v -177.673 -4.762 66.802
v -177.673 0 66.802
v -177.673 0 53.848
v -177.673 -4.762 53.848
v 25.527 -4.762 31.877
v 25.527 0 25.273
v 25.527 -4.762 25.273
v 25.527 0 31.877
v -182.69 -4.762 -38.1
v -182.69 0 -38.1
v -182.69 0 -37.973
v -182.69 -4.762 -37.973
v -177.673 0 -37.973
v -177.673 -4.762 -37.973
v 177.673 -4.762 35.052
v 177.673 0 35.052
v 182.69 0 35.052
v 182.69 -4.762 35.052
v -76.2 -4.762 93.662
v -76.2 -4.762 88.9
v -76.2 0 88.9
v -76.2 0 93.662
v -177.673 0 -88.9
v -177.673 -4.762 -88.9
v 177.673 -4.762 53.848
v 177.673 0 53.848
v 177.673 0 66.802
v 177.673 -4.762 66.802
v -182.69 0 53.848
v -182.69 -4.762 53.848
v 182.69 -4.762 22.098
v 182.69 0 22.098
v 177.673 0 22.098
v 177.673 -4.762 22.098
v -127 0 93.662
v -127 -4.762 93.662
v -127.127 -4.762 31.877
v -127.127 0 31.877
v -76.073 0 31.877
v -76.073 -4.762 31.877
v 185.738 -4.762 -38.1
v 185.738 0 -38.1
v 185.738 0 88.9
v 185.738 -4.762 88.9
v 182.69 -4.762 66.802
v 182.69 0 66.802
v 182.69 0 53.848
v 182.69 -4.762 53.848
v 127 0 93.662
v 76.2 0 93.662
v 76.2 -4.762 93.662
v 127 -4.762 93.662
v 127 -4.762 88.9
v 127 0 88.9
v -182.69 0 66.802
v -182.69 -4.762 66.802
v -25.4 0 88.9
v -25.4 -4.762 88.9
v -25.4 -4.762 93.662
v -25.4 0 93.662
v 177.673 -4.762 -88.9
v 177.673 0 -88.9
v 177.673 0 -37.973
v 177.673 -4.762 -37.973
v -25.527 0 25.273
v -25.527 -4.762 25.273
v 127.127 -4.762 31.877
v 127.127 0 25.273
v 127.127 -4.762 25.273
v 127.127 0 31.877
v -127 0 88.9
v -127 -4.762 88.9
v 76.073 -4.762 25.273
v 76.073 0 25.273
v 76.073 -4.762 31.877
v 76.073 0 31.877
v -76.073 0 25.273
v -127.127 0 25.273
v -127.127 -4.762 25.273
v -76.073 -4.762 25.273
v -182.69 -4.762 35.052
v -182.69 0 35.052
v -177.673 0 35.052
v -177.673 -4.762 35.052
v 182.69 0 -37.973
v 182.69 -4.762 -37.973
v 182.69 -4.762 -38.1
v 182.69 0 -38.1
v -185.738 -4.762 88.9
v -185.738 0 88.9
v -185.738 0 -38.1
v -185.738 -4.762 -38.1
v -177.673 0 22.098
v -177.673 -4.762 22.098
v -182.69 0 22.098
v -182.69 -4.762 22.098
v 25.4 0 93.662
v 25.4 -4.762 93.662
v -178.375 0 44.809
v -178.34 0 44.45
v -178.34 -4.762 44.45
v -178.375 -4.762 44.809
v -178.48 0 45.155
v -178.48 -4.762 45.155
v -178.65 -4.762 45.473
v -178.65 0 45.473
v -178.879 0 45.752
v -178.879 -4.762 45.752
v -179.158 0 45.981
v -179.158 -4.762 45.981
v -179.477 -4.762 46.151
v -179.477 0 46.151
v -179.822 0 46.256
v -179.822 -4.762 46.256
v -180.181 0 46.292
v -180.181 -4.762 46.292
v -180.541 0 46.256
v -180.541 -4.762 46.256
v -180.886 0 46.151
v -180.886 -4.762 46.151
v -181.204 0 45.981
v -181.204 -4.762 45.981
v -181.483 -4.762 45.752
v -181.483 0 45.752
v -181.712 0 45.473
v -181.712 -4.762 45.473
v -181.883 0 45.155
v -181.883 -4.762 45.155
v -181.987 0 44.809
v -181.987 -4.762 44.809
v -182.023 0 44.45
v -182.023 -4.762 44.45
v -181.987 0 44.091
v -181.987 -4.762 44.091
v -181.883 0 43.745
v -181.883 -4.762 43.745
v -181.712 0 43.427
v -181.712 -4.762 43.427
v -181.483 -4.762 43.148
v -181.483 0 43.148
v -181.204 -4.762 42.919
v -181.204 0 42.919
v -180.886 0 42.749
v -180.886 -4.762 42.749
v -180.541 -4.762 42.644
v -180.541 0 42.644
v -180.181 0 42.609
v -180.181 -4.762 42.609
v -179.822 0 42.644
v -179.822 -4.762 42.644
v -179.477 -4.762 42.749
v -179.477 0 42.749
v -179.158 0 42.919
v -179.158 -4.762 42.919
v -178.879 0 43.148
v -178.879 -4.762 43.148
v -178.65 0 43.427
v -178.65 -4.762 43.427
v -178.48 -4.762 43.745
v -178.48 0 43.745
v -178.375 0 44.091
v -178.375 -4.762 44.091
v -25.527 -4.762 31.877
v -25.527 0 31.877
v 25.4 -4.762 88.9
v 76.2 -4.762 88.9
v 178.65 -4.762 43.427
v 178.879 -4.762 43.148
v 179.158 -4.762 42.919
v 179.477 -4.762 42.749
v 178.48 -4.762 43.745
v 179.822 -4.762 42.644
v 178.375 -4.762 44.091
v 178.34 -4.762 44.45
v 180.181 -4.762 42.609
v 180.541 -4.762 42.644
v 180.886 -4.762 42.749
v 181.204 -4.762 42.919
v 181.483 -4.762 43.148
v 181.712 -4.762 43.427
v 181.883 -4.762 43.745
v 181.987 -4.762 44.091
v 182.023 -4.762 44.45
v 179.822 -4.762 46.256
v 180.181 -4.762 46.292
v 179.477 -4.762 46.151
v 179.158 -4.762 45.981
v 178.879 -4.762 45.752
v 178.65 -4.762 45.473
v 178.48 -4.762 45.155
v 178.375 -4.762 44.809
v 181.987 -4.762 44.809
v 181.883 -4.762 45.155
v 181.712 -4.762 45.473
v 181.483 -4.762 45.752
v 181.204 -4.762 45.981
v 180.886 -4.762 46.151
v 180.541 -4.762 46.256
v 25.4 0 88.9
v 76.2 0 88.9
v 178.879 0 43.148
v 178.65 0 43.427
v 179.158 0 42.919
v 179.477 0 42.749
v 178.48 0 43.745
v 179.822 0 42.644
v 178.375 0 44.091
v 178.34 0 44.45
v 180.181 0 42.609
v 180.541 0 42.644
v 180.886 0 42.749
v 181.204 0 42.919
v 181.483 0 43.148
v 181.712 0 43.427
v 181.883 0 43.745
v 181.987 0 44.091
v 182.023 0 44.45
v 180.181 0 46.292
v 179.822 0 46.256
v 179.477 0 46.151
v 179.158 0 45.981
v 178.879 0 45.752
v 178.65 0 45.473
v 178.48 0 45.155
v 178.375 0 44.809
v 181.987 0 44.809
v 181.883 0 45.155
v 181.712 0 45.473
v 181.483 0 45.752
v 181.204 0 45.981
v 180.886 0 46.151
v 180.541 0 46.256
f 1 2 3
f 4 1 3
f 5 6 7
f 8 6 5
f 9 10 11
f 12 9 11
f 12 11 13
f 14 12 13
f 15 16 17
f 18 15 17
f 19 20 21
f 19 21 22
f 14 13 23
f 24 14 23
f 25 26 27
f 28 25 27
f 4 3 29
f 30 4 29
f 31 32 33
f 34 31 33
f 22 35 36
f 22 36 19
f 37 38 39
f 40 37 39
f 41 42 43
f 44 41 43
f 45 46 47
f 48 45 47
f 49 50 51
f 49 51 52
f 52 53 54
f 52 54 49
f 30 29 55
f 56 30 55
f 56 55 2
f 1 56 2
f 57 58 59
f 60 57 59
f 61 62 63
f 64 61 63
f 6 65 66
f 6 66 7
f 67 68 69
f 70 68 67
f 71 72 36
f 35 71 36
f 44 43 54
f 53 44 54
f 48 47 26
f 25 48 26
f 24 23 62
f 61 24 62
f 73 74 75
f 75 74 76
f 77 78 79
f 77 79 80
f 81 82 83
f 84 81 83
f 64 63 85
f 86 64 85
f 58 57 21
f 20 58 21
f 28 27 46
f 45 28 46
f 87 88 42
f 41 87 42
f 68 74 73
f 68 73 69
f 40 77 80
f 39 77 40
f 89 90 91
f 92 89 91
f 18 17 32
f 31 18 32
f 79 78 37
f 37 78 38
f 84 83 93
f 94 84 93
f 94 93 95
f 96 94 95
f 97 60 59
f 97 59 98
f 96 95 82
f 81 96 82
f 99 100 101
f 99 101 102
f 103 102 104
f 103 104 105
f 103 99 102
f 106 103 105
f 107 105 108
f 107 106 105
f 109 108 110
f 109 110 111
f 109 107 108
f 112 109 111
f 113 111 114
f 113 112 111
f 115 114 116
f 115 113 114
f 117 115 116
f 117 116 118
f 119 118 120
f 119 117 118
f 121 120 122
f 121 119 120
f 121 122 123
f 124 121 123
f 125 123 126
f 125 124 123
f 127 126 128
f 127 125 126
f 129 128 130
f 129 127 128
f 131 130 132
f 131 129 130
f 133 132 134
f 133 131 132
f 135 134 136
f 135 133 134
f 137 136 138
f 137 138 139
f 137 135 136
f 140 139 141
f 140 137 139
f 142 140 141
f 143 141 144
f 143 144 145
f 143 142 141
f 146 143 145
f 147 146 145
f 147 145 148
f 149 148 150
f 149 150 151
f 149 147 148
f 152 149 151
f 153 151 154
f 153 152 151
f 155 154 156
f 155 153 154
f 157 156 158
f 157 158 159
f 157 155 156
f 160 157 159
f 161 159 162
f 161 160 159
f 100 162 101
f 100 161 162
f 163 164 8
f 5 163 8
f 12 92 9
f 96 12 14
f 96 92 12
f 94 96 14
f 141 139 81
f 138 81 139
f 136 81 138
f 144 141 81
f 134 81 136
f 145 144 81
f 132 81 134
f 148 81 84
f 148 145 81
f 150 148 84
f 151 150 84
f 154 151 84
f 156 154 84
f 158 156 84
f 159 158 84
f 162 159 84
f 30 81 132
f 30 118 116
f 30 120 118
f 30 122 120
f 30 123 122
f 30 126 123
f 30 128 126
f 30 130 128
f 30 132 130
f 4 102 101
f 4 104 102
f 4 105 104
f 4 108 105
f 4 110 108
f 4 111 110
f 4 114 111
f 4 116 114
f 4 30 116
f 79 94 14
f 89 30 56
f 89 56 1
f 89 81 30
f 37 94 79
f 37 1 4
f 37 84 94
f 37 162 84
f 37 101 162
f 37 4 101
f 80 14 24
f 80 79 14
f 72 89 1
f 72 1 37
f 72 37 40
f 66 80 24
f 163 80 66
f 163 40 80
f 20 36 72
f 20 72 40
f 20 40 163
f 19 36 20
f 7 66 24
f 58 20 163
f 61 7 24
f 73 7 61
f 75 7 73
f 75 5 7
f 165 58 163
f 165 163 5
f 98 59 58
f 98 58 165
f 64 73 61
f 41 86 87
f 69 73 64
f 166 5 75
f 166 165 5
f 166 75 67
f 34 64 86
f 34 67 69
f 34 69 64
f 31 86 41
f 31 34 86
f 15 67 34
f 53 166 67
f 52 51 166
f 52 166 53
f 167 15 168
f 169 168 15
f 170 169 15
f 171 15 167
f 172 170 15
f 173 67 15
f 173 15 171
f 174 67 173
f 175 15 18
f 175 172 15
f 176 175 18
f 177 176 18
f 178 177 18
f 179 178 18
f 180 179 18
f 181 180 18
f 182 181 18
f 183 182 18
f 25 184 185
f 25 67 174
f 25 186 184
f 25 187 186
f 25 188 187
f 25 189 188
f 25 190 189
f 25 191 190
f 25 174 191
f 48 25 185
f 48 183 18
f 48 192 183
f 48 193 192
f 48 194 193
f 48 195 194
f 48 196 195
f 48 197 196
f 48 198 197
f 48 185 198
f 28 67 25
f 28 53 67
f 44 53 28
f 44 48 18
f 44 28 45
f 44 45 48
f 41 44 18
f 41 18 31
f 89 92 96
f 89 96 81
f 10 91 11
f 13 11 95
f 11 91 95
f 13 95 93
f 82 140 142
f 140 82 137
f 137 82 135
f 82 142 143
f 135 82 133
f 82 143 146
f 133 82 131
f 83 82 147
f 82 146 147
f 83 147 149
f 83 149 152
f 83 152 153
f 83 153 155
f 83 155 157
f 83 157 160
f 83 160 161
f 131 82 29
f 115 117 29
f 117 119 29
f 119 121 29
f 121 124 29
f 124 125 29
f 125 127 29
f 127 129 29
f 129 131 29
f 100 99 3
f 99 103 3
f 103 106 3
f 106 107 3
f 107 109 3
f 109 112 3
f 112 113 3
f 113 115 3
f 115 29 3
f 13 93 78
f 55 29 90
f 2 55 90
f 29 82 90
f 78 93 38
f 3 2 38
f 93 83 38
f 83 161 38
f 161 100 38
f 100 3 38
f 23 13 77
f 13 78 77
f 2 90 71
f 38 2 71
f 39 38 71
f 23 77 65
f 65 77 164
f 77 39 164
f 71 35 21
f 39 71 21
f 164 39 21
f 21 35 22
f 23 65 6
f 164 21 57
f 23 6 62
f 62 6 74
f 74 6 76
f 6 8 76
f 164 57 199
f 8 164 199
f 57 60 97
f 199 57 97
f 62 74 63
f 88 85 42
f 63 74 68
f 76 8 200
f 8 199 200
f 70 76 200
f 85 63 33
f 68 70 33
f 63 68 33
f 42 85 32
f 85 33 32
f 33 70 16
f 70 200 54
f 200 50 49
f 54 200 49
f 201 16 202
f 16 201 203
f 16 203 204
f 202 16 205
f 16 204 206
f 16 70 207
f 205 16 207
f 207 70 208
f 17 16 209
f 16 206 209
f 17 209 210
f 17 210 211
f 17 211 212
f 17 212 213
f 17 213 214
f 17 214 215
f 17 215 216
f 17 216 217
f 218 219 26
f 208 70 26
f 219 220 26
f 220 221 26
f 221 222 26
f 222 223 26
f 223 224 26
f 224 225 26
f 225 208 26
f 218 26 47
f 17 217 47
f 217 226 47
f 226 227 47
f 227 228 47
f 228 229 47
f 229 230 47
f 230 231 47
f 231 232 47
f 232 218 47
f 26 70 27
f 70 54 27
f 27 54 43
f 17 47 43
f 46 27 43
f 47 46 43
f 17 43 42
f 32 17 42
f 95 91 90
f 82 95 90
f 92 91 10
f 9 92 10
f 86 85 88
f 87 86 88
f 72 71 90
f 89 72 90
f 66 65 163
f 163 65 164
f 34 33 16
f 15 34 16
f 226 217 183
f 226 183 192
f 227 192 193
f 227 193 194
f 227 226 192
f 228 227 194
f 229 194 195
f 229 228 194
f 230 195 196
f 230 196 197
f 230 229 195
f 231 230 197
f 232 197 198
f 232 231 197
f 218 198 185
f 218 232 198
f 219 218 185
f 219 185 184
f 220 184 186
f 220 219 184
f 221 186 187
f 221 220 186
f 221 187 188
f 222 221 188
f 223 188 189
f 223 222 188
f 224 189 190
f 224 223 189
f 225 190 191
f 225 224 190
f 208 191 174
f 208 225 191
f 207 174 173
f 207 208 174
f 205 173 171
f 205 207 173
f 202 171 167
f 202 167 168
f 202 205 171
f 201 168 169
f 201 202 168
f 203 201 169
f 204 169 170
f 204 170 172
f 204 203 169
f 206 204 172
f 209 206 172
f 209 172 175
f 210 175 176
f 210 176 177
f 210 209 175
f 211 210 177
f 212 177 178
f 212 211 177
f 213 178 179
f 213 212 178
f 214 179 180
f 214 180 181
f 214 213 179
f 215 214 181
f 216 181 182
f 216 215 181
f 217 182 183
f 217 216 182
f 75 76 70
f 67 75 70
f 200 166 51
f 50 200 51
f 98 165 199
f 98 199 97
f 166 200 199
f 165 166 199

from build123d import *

# Parameters (mm, degrees)
F0_R     = 1.8415
F0_W     = 51.054
F0_H     = 6.604
F0_W_2   = 50.8
F0_H_2   = 4.7625
F1_DEPTH = 4.7625


with BuildPart() as f1:
    # F0 (on Front) → F1 (new body)
    with BuildSketch(Plane.XZ):
        Polygon((-127, 88.9), (-182.5625, 88.9), (-182.5625, 66.802), (-177.673, 66.802), (-177.673, 53.848), (-182.5625, 53.848), (-182.5625, 35.052), (-177.673, 35.052), (-177.673, 22.098), (-182.5625, 22.098), (-182.5625, -37.973), (-177.673, -37.973), (-177.673, -88.9), (177.673, -88.9), (177.673, -37.973), (182.5625, -37.973), (182.5625, 22.098), (177.673, 22.098), (177.673, 35.052), (182.5625, 35.052), (182.5625, 53.848), (177.673, 53.848), (177.673, 66.802), (182.5625, 66.802), (182.5625, 88.9), (127, 88.9), (76.2, 88.9), (25.4, 88.9), (-25.4, 88.9), (-76.2, 88.9), align=None)
        with Locations((-180.18125, 44.45)):
            Circle(F0_R, mode=Mode.SUBTRACT)
        with Locations((-101.6, 28.575)):
            Rectangle(F0_W, F0_H, mode=Mode.SUBTRACT)
        with Locations((0, 28.575)):
            Rectangle(F0_W, F0_H, mode=Mode.SUBTRACT)
        with Locations((101.6, 28.575)):
            Rectangle(F0_W, F0_H, mode=Mode.SUBTRACT)
        with Locations((180.18125, 44.45)):
            Circle(F0_R, mode=Mode.SUBTRACT)
        with Locations((-101.6, 91.28125)):
            Rectangle(F0_W_2, F0_H_2)
        with Locations((0, 91.28125)):
            Rectangle(F0_W_2, F0_H_2)
        with Locations((101.6, 91.28125)):
            Rectangle(F0_W_2, F0_H_2)
        Polygon((-182.5625, 66.802), (-182.5625, 88.9), (-185.7375, 88.9), (-185.7375, -38.1), (-182.6895, -38.1), (-182.6895, -37.973), (-182.5625, -37.973), (-182.5625, 22.098), (-182.6895, 22.098), (-182.6895, 35.052), (-182.5625, 35.052), (-182.5625, 53.848), (-182.6895, 53.848), (-182.6895, 66.802), align=None)
        Polygon((185.7375, 88.9), (182.5625, 88.9), (182.5625, 66.802), (182.6895, 66.802), (182.6895, 53.848), (182.5625, 53.848), (182.5625, 35.052), (182.6895, 35.052), (182.6895, 22.098), (182.5625, 22.098), (182.5625, -37.973), (182.6895, -37.973), (182.6895, -38.1), (185.7375, -38.1), align=None)
    extrude(amount=F1_DEPTH)


solid = f1.part
